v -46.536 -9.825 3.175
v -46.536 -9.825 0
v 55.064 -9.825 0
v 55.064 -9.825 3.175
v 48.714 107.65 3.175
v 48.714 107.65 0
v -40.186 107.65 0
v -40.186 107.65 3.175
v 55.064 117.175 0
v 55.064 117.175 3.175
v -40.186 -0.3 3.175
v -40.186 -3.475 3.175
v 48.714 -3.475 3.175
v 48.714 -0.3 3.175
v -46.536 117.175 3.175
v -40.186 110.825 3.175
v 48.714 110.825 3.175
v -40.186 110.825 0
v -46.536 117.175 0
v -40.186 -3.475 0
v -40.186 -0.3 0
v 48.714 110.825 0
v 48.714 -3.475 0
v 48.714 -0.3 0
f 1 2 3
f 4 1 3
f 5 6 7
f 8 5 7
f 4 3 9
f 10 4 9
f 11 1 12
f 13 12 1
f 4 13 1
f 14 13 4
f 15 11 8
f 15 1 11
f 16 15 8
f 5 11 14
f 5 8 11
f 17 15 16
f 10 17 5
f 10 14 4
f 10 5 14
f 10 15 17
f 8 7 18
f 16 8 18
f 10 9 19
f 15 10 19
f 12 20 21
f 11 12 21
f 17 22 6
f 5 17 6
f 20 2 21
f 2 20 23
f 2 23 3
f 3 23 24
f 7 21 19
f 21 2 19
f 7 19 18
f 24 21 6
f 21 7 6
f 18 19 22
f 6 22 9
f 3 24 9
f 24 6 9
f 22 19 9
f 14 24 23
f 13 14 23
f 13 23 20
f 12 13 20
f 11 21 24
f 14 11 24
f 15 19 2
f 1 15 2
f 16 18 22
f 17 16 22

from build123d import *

# Parameters (mm, degrees)
F0_W     = 6.35
F0_H     = 6.35
F0_W_2   = 88.9
F1_DEPTH = 3.175


with BuildPart() as f1:
    # F0 (on Top) → F1 (new body)
    with BuildSketch(Plane.XY):
        with Locations((-43.360994, 113.999984)):
            Rectangle(F0_W, F0_H)
        with Locations((4.264006, 113.999984)):
            Rectangle(F0_W_2, F0_H)
        Polygon((-40.185994, 110.824984), (-46.535994, 110.824984), (-46.535994, -3.475016), (-40.185994, -3.475016), (-40.185994, -0.300016), (48.714006, -0.300016), (48.714006, -3.475016), (55.064006, -3.475016), (55.064006, 110.824984), (48.714006, 110.824984), (48.714006, 107.649984), (-40.185994, 107.649984), align=None)
        with Locations((51.889006, 113.999984)):
            Rectangle(F0_W, F0_H)
        with Locations((-43.360994, -6.650016)):
            Rectangle(F0_W, F0_H)
        Polygon((48.714006, -3.475016), (-40.185994, -3.475016), (-40.185994, -9.825016), (4.264006, -9.825016), (48.714006, -9.825016), align=None)
        with Locations((51.889006, -6.650016)):
            Rectangle(F0_W, F0_H)
    extrude(amount=F1_DEPTH)


solid = f1.part
